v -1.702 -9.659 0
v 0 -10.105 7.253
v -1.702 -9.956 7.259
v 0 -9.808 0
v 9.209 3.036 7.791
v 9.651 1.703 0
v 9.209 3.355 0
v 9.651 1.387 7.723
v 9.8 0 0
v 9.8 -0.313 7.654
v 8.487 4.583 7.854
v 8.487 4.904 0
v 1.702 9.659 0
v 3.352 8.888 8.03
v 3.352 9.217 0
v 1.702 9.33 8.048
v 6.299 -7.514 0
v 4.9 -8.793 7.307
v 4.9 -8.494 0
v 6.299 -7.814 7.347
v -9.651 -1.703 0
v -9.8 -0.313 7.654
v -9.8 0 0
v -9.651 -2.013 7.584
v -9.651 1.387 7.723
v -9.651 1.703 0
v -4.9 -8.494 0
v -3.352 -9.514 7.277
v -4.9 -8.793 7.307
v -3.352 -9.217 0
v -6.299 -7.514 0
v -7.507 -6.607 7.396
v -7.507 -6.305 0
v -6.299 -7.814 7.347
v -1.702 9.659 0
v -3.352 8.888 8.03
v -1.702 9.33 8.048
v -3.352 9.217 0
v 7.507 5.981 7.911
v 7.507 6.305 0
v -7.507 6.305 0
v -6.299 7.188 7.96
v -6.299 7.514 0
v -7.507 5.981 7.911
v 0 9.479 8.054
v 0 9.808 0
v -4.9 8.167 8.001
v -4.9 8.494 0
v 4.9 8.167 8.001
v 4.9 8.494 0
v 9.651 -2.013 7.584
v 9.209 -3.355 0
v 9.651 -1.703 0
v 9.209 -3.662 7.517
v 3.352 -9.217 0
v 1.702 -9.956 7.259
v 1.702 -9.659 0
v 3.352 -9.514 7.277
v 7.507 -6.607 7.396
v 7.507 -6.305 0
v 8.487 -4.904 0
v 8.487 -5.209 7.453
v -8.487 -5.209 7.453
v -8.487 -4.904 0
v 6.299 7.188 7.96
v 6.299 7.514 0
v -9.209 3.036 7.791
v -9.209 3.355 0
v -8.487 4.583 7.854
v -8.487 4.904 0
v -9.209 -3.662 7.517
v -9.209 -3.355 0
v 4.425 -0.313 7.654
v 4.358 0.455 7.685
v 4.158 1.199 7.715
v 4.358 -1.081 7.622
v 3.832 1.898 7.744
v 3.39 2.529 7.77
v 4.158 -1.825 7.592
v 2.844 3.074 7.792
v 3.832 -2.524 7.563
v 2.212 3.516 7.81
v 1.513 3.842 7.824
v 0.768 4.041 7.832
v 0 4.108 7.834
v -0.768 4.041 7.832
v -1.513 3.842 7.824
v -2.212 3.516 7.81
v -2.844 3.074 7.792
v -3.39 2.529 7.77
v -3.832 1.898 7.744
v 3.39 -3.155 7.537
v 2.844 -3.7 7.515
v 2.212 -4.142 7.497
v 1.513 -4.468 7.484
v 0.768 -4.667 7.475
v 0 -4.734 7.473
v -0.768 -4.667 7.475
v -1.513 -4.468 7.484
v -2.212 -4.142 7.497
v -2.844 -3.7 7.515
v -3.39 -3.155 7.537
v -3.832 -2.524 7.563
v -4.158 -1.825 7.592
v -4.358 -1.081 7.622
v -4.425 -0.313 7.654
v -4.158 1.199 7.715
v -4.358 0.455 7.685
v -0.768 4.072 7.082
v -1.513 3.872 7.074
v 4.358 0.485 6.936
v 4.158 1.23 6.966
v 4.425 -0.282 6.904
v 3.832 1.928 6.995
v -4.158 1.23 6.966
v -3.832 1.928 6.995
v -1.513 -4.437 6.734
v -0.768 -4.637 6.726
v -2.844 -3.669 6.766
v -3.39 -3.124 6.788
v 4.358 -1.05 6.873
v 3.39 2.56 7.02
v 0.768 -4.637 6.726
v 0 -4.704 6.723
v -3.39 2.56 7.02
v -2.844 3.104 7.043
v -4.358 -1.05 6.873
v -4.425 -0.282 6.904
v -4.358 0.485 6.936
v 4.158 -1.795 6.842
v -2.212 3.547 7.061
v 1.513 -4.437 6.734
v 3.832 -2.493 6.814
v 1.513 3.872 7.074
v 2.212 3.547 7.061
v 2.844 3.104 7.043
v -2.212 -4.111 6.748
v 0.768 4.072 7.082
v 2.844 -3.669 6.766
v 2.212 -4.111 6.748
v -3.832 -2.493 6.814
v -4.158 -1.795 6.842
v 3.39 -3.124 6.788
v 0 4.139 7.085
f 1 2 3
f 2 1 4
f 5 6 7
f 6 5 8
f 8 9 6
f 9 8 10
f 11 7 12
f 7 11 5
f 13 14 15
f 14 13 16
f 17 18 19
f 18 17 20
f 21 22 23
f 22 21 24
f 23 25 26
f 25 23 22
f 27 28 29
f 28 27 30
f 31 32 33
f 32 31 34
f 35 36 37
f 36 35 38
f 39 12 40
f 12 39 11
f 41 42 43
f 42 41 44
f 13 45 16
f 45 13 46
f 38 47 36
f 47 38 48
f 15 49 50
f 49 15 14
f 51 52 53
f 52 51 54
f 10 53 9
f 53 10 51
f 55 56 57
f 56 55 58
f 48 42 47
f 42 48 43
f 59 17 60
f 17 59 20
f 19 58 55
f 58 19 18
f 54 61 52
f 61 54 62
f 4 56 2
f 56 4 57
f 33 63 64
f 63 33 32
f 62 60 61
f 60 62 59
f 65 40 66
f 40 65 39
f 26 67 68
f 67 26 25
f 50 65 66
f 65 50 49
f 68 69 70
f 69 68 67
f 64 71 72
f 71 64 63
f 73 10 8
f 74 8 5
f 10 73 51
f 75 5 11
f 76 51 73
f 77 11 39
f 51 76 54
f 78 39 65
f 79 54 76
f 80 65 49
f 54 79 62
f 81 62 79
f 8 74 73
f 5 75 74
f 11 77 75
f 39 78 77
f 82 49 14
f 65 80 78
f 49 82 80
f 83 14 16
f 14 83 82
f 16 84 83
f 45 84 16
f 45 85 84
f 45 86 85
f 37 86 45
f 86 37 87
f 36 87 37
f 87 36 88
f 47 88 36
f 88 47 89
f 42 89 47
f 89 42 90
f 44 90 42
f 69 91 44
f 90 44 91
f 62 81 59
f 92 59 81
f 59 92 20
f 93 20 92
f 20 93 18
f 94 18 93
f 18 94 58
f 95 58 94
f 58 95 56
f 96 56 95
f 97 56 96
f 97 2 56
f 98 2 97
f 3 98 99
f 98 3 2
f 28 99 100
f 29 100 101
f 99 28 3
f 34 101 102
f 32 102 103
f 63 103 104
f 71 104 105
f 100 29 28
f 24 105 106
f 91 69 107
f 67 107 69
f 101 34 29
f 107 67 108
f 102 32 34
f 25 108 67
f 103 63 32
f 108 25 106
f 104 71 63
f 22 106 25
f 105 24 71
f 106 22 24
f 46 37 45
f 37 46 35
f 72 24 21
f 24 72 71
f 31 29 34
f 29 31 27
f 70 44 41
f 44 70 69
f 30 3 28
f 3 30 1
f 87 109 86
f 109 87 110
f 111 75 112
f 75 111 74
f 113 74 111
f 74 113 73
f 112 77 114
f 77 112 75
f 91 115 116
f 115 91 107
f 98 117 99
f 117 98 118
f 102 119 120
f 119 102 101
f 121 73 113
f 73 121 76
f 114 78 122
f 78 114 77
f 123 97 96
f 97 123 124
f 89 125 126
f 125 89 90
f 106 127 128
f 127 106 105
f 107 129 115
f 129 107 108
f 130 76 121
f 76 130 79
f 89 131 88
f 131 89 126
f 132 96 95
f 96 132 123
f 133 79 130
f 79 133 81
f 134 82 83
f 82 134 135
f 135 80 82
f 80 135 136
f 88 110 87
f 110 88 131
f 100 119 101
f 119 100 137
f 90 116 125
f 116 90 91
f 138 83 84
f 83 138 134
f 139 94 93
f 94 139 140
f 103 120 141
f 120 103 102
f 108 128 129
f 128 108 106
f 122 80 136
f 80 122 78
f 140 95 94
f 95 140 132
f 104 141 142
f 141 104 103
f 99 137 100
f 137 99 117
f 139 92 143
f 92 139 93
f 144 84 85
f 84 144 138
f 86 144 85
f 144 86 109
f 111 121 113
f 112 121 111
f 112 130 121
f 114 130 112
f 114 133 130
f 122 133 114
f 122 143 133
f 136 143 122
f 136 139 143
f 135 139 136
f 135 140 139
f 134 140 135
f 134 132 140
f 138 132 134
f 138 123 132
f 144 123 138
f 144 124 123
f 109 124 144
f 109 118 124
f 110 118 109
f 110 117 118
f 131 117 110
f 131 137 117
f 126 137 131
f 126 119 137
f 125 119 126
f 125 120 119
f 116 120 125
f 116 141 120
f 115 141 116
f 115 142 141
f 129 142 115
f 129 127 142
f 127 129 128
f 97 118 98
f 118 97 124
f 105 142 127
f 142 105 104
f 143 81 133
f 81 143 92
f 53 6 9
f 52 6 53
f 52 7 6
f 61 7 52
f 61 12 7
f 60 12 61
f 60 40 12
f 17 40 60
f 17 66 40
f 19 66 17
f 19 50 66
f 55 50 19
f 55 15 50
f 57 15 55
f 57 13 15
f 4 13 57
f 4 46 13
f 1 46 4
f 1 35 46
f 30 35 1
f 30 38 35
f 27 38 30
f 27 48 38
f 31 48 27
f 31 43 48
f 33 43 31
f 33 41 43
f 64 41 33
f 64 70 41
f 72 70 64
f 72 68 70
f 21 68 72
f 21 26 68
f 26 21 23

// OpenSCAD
tolerance = 0.2;
d=20;
h=9;
angle = atan(h/220);
rubberStickyHeight = 2.09;
rubberInset = 0.75;
adjHeight = h - (rubberStickyHeight-rubberInset);

$fn = 36;

render(convexity=2)
intersection() {
    rotate([angle,0,0])
    difference() {
        translate([0,0,-10])
        cylinder(d=d-2*tolerance, h=adjHeight+10);
        translate([0,0,adjHeight-rubberInset])
        cylinder(d=8.45+2*tolerance, h=rubberInset+1);
    }
    cylinder(d=d+10, h=adjHeight+10);
}
